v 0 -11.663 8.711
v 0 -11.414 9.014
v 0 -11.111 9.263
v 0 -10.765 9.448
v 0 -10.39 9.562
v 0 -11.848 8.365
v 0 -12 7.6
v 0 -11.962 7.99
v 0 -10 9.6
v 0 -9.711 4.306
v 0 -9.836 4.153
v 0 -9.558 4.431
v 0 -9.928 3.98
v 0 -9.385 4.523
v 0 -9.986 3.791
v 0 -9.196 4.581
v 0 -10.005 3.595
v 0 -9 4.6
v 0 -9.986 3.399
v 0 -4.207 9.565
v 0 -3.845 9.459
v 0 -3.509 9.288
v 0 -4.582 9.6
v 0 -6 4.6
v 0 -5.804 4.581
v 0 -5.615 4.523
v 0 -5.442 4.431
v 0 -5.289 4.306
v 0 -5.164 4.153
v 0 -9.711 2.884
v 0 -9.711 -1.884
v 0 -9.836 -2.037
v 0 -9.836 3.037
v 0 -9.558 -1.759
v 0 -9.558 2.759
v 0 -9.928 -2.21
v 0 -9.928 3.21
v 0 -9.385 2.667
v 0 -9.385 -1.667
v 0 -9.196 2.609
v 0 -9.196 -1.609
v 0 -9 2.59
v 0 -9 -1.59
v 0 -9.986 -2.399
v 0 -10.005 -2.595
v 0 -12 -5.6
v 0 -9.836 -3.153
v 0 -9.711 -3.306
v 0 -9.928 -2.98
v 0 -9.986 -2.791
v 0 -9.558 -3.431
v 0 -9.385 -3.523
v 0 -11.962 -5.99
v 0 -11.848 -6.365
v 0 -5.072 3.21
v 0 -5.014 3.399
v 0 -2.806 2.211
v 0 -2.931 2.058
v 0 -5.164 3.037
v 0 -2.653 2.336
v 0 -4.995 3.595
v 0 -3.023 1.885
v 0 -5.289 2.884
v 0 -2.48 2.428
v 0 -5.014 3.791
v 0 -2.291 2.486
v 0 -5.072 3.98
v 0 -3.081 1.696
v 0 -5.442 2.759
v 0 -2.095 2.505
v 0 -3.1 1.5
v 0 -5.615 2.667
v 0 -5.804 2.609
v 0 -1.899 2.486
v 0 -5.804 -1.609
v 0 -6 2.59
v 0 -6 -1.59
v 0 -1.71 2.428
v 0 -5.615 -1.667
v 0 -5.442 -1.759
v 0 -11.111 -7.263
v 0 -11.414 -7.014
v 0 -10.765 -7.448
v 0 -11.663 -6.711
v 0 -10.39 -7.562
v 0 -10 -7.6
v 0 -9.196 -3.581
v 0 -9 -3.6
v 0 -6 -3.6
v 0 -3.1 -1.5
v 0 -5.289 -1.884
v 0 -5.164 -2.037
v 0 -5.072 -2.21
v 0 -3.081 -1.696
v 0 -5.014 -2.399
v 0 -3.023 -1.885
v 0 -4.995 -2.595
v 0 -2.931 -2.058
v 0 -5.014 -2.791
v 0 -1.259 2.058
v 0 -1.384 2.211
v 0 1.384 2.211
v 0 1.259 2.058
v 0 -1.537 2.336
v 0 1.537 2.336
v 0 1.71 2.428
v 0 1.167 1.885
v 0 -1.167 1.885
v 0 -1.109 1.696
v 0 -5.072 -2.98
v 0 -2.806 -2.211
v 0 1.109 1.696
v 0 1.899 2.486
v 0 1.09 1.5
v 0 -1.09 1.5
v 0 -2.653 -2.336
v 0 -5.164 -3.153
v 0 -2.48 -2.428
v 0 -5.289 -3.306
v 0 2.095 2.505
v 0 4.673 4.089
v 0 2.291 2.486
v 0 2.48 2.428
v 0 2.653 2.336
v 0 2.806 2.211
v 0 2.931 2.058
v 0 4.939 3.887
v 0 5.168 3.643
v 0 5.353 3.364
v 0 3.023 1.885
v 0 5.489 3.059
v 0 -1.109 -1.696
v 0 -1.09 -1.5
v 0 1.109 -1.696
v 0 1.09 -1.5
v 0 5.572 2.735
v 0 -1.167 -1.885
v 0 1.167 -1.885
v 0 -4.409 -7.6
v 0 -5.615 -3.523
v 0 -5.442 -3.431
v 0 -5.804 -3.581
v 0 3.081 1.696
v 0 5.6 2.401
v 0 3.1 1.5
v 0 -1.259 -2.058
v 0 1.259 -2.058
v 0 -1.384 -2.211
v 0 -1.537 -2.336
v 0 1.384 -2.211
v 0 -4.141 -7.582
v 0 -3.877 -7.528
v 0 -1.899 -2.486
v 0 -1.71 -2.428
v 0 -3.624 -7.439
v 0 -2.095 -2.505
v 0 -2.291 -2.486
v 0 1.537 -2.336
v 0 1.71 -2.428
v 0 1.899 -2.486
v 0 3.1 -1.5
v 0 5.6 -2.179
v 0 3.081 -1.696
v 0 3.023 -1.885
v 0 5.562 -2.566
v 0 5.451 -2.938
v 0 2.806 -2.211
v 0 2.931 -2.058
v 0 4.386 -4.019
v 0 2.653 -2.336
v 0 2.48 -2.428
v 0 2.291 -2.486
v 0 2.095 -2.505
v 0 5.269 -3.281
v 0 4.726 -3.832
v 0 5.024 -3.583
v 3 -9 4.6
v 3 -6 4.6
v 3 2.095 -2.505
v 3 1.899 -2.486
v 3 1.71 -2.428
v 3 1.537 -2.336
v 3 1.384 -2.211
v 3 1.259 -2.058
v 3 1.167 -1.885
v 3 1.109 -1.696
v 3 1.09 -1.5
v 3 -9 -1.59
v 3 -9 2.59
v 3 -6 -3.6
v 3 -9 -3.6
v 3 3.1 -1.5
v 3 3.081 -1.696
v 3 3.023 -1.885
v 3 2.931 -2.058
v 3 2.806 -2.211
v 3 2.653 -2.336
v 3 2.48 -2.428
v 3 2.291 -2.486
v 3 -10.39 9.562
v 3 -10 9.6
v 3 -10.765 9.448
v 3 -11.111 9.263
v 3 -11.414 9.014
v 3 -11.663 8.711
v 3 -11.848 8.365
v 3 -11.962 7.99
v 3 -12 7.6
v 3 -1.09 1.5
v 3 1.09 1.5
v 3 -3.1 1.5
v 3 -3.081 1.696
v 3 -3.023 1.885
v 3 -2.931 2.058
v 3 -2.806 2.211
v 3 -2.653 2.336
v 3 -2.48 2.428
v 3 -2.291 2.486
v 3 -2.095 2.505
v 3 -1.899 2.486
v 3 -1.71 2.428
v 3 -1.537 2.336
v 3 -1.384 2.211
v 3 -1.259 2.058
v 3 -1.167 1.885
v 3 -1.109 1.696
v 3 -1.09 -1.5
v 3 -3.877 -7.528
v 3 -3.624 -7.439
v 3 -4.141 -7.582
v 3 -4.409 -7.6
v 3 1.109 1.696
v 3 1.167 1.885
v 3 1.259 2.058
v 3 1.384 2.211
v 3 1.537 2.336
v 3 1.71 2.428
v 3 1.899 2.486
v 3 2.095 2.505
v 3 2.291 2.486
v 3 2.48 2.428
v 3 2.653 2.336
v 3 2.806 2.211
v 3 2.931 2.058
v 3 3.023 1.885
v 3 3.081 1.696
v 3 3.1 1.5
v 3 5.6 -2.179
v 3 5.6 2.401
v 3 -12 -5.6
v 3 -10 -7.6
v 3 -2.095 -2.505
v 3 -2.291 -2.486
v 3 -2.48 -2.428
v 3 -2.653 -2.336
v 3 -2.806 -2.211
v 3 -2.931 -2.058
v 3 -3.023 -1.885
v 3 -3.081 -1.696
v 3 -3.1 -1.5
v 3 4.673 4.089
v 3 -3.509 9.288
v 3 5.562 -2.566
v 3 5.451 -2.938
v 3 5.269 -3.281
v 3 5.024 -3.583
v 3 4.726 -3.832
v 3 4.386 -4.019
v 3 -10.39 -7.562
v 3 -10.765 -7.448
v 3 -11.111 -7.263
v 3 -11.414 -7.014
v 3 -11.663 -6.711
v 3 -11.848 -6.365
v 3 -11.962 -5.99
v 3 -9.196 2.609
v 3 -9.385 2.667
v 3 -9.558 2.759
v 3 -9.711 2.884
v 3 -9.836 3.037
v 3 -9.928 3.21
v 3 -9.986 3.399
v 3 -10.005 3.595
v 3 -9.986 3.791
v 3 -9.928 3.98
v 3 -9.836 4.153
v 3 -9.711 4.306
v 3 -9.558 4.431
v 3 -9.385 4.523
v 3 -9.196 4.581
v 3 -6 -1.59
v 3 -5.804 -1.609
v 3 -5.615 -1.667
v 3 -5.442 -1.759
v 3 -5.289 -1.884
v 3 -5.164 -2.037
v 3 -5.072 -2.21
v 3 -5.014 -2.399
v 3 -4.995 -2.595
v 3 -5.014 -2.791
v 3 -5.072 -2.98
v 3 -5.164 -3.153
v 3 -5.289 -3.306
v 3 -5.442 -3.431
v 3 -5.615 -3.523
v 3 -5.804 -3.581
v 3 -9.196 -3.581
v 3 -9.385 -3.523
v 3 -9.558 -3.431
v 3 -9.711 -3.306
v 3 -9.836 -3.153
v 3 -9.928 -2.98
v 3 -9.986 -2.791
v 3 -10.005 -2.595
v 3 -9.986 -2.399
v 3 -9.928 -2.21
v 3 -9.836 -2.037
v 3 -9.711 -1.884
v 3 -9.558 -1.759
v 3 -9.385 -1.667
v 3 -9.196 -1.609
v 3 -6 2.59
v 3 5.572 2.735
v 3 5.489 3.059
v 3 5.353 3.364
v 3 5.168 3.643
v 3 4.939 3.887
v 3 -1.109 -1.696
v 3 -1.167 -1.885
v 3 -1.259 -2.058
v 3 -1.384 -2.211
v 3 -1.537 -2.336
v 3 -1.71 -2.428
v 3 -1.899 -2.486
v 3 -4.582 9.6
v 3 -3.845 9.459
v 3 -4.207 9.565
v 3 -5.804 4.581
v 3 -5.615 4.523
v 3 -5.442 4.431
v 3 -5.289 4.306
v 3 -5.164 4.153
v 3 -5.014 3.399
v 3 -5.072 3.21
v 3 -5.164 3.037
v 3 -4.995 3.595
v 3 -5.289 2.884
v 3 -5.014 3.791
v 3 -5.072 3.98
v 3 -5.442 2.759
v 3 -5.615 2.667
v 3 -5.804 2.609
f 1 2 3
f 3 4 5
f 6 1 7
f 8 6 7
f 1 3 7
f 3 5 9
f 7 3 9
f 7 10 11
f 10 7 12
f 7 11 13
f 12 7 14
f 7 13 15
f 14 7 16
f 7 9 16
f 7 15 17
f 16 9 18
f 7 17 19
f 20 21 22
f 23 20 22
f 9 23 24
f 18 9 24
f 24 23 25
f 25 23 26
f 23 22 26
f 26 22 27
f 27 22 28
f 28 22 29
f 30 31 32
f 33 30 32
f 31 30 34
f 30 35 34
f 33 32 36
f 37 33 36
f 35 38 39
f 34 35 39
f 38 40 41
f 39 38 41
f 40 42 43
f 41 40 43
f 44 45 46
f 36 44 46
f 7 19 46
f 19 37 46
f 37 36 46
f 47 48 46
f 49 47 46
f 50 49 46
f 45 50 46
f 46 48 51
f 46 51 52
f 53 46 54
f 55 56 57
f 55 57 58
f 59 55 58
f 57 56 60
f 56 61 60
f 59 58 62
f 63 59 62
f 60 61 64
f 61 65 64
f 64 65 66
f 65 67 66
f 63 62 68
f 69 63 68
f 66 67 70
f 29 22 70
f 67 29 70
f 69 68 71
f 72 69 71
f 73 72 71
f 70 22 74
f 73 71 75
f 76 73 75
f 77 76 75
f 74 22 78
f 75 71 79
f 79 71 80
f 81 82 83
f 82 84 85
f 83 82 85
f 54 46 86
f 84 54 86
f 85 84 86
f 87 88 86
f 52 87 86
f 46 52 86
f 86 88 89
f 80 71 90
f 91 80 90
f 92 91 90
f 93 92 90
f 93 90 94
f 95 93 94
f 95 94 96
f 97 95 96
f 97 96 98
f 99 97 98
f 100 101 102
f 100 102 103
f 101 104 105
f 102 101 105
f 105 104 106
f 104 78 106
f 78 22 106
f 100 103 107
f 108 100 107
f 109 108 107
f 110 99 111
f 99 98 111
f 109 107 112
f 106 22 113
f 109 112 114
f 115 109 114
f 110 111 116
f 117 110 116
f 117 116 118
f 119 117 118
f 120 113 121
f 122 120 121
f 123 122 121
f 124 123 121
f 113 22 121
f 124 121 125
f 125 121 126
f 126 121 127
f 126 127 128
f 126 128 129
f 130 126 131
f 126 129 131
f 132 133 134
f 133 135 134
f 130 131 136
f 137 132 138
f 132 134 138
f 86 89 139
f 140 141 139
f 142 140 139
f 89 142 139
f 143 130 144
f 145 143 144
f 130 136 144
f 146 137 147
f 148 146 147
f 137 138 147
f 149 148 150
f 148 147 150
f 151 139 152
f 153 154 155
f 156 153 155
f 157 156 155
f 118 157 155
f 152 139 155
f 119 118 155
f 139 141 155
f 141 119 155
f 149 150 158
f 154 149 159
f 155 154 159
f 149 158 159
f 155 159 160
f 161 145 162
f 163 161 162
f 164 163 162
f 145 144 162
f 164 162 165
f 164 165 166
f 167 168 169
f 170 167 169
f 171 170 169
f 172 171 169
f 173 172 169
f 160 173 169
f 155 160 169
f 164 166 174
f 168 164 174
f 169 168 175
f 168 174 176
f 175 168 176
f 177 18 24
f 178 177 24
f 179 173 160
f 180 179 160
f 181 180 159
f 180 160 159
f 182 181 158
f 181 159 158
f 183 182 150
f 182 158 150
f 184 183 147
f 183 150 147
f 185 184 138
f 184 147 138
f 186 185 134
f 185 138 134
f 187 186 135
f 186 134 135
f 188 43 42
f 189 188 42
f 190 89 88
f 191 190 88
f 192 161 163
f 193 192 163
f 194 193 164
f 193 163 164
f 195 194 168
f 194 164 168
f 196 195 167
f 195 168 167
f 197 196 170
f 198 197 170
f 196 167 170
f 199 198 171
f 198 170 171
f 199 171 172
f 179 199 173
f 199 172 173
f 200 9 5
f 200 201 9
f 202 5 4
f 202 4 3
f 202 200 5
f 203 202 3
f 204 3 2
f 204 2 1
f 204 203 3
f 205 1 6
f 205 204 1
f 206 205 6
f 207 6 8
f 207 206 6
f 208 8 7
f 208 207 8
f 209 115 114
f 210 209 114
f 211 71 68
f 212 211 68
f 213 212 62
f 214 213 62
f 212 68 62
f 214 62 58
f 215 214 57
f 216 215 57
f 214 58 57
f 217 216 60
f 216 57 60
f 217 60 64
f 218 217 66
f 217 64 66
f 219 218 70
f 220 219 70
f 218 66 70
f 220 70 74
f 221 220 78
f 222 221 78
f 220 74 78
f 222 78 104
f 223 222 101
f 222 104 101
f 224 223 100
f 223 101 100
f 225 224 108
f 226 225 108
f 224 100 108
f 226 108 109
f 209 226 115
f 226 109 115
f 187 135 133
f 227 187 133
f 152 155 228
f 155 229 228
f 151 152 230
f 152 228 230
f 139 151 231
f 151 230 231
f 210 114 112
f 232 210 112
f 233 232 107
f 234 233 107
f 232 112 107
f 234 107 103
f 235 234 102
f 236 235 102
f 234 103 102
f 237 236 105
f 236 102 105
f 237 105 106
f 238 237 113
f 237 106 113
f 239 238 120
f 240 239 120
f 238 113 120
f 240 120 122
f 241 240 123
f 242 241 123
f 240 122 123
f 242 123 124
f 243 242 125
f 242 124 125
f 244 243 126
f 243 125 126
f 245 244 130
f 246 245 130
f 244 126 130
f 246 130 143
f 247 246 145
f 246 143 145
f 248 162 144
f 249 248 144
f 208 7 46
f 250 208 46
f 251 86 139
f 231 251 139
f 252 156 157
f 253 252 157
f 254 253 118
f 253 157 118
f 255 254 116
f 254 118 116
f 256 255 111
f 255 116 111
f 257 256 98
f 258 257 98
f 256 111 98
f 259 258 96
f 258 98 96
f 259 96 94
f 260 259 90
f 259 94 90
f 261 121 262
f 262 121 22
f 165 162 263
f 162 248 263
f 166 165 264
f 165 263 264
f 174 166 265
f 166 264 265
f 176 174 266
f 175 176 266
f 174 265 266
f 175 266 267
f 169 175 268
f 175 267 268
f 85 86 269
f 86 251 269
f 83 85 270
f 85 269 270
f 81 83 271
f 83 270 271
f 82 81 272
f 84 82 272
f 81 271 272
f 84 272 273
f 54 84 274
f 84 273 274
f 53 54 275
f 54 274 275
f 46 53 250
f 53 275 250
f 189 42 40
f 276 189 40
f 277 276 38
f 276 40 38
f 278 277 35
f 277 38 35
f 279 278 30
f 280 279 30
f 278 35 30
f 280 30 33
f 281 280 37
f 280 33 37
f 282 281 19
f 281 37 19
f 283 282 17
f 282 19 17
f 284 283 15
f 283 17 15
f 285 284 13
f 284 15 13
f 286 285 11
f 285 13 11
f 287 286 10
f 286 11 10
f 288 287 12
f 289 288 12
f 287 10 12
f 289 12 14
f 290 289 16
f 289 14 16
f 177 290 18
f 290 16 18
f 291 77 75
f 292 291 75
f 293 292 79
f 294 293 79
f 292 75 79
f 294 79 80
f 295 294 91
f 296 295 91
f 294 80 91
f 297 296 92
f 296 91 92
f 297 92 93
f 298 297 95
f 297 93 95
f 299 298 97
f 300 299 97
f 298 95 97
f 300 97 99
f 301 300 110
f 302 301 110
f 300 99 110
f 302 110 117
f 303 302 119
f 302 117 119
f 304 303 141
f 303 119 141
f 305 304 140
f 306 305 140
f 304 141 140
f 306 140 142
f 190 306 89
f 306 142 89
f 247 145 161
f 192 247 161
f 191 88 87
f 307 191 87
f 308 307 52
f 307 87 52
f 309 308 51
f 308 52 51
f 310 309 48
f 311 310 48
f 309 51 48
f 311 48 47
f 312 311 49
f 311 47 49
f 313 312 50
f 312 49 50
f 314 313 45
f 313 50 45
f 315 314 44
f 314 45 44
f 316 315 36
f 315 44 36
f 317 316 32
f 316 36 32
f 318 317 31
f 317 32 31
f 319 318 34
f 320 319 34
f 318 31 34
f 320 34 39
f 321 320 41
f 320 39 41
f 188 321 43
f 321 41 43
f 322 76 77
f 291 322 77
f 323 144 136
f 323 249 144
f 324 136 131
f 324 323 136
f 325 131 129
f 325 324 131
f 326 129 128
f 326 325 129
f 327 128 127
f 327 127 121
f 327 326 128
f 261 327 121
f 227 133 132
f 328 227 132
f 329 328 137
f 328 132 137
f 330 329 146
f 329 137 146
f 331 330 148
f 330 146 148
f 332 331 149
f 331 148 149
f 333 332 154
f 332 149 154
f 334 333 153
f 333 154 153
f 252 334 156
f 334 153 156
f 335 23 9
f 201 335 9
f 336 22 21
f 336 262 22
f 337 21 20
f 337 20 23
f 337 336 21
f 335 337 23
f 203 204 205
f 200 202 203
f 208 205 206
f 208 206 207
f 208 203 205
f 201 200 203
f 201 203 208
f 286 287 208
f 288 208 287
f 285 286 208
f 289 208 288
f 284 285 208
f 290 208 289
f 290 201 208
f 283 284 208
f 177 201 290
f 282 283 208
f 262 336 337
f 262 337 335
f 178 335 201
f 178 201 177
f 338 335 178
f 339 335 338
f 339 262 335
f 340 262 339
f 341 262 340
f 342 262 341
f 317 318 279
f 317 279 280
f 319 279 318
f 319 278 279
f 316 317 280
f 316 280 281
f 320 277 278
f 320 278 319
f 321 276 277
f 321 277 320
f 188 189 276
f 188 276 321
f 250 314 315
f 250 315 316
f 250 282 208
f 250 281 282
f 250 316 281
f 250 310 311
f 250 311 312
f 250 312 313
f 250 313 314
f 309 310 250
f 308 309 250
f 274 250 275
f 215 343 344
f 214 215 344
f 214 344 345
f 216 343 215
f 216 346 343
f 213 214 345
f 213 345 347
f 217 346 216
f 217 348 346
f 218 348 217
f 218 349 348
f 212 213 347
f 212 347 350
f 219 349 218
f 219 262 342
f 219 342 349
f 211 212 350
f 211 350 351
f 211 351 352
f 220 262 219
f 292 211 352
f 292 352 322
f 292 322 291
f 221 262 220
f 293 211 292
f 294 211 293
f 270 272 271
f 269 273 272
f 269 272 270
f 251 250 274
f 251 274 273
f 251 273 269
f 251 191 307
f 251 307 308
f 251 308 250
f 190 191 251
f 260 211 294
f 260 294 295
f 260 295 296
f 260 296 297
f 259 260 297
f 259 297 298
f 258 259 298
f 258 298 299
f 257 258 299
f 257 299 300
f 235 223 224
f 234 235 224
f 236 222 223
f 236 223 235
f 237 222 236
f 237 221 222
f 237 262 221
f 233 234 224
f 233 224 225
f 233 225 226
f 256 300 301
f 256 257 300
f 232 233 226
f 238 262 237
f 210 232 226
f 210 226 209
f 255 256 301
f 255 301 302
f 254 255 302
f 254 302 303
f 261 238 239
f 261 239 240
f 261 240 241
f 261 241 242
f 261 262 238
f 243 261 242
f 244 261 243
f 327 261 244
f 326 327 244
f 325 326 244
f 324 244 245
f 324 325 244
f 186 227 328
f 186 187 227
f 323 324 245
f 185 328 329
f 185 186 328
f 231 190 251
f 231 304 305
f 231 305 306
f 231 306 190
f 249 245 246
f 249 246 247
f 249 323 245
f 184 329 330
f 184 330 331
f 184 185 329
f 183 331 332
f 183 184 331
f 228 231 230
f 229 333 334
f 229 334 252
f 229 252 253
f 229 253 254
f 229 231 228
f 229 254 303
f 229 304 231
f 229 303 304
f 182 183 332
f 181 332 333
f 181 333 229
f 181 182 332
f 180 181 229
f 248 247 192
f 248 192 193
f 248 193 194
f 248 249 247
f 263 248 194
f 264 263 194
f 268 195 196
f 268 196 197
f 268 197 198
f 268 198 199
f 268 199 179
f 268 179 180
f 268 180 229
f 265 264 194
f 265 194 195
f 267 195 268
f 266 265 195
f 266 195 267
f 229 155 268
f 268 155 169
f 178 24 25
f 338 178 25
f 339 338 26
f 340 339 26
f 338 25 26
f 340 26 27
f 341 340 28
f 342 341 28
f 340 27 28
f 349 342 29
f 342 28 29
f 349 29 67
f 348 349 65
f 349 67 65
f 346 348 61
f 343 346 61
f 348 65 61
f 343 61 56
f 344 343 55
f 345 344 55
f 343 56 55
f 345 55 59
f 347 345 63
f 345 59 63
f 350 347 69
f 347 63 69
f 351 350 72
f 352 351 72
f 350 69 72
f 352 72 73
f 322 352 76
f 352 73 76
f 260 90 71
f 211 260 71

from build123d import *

# Parameters (mm, degrees)
EXTRUDE_1_DEPTH = 3
FILLET_1_R      = 2


with BuildPart() as part:
    # 草图1 → 凸台-拉伸1 (new body)
    with BuildSketch(Plane(origin=(0, 0, 0), x_dir=(0, 0, -1), z_dir=(1, 0, 0))):
        Polygon((3.5, 5.6), (-3.5, 5.6), (-9.6, -4), (-9.6, -12), (7.6, -12), (7.6, -4), align=None)
        with BuildLine():
            ThreePointArc((-2.59, -9), (-3.595, -10.005), (-4.6, -9))
            Line((-4.6, -9), (-4.6, -6))
            ThreePointArc((-4.6, -6), (-3.595, -4.995), (-2.59, -6))
            Line((-2.59, -6), (1.59, -6))
            ThreePointArc((1.59, -6), (2.595, -4.995), (3.6, -6))
            Line((3.6, -6), (3.6, -9))
            ThreePointArc((3.6, -9), (2.595, -10.005), (1.59, -9))
            Line((1.59, -9), (-2.59, -9))
        make_face(mode=Mode.SUBTRACT)
        with BuildLine():
            ThreePointArc((2.505, -2.095), (2.210642315, -2.805642315), (1.5, -3.1))
            Line((1.5, -3.1), (-1.5, -3.1))
            ThreePointArc((-1.5, -3.1), (-2.505, -2.095), (-1.5, -1.09))
            Line((-1.5, -1.09), (-1.5, 1.09))
            ThreePointArc((-1.5, 1.09), (-2.505, 2.095), (-1.5, 3.1))
            Line((-1.5, 3.1), (1.5, 3.1))
            ThreePointArc((1.5, 3.1), (2.210642315, 2.805642315), (2.505, 2.095))
            ThreePointArc((2.505, 2.095), (2.210642315, 1.384357685), (1.5, 1.09))
            Line((1.5, 1.09), (1.5, -1.09))
            ThreePointArc((1.5, -1.09), (2.210642315, -1.384357685), (2.505, -2.095))
        make_face(mode=Mode.SUBTRACT)
    extrude(amount=EXTRUDE_1_DEPTH)

    # 圆角1
    fillet_1_edges = [part.edges().sort_by_distance(p)[0] for p in [
        (1.5, 5.6, 3.5),
        (1.5, 5.6, -3.5),
        (1.5, -4, -7.6),
        (1.5, -12, -7.6),
        (1.5, -12, 9.6),
        (1.5, -4, 9.6),
    ]]
    fillet(fillet_1_edges, radius=FILLET_1_R)


solid = part.part
